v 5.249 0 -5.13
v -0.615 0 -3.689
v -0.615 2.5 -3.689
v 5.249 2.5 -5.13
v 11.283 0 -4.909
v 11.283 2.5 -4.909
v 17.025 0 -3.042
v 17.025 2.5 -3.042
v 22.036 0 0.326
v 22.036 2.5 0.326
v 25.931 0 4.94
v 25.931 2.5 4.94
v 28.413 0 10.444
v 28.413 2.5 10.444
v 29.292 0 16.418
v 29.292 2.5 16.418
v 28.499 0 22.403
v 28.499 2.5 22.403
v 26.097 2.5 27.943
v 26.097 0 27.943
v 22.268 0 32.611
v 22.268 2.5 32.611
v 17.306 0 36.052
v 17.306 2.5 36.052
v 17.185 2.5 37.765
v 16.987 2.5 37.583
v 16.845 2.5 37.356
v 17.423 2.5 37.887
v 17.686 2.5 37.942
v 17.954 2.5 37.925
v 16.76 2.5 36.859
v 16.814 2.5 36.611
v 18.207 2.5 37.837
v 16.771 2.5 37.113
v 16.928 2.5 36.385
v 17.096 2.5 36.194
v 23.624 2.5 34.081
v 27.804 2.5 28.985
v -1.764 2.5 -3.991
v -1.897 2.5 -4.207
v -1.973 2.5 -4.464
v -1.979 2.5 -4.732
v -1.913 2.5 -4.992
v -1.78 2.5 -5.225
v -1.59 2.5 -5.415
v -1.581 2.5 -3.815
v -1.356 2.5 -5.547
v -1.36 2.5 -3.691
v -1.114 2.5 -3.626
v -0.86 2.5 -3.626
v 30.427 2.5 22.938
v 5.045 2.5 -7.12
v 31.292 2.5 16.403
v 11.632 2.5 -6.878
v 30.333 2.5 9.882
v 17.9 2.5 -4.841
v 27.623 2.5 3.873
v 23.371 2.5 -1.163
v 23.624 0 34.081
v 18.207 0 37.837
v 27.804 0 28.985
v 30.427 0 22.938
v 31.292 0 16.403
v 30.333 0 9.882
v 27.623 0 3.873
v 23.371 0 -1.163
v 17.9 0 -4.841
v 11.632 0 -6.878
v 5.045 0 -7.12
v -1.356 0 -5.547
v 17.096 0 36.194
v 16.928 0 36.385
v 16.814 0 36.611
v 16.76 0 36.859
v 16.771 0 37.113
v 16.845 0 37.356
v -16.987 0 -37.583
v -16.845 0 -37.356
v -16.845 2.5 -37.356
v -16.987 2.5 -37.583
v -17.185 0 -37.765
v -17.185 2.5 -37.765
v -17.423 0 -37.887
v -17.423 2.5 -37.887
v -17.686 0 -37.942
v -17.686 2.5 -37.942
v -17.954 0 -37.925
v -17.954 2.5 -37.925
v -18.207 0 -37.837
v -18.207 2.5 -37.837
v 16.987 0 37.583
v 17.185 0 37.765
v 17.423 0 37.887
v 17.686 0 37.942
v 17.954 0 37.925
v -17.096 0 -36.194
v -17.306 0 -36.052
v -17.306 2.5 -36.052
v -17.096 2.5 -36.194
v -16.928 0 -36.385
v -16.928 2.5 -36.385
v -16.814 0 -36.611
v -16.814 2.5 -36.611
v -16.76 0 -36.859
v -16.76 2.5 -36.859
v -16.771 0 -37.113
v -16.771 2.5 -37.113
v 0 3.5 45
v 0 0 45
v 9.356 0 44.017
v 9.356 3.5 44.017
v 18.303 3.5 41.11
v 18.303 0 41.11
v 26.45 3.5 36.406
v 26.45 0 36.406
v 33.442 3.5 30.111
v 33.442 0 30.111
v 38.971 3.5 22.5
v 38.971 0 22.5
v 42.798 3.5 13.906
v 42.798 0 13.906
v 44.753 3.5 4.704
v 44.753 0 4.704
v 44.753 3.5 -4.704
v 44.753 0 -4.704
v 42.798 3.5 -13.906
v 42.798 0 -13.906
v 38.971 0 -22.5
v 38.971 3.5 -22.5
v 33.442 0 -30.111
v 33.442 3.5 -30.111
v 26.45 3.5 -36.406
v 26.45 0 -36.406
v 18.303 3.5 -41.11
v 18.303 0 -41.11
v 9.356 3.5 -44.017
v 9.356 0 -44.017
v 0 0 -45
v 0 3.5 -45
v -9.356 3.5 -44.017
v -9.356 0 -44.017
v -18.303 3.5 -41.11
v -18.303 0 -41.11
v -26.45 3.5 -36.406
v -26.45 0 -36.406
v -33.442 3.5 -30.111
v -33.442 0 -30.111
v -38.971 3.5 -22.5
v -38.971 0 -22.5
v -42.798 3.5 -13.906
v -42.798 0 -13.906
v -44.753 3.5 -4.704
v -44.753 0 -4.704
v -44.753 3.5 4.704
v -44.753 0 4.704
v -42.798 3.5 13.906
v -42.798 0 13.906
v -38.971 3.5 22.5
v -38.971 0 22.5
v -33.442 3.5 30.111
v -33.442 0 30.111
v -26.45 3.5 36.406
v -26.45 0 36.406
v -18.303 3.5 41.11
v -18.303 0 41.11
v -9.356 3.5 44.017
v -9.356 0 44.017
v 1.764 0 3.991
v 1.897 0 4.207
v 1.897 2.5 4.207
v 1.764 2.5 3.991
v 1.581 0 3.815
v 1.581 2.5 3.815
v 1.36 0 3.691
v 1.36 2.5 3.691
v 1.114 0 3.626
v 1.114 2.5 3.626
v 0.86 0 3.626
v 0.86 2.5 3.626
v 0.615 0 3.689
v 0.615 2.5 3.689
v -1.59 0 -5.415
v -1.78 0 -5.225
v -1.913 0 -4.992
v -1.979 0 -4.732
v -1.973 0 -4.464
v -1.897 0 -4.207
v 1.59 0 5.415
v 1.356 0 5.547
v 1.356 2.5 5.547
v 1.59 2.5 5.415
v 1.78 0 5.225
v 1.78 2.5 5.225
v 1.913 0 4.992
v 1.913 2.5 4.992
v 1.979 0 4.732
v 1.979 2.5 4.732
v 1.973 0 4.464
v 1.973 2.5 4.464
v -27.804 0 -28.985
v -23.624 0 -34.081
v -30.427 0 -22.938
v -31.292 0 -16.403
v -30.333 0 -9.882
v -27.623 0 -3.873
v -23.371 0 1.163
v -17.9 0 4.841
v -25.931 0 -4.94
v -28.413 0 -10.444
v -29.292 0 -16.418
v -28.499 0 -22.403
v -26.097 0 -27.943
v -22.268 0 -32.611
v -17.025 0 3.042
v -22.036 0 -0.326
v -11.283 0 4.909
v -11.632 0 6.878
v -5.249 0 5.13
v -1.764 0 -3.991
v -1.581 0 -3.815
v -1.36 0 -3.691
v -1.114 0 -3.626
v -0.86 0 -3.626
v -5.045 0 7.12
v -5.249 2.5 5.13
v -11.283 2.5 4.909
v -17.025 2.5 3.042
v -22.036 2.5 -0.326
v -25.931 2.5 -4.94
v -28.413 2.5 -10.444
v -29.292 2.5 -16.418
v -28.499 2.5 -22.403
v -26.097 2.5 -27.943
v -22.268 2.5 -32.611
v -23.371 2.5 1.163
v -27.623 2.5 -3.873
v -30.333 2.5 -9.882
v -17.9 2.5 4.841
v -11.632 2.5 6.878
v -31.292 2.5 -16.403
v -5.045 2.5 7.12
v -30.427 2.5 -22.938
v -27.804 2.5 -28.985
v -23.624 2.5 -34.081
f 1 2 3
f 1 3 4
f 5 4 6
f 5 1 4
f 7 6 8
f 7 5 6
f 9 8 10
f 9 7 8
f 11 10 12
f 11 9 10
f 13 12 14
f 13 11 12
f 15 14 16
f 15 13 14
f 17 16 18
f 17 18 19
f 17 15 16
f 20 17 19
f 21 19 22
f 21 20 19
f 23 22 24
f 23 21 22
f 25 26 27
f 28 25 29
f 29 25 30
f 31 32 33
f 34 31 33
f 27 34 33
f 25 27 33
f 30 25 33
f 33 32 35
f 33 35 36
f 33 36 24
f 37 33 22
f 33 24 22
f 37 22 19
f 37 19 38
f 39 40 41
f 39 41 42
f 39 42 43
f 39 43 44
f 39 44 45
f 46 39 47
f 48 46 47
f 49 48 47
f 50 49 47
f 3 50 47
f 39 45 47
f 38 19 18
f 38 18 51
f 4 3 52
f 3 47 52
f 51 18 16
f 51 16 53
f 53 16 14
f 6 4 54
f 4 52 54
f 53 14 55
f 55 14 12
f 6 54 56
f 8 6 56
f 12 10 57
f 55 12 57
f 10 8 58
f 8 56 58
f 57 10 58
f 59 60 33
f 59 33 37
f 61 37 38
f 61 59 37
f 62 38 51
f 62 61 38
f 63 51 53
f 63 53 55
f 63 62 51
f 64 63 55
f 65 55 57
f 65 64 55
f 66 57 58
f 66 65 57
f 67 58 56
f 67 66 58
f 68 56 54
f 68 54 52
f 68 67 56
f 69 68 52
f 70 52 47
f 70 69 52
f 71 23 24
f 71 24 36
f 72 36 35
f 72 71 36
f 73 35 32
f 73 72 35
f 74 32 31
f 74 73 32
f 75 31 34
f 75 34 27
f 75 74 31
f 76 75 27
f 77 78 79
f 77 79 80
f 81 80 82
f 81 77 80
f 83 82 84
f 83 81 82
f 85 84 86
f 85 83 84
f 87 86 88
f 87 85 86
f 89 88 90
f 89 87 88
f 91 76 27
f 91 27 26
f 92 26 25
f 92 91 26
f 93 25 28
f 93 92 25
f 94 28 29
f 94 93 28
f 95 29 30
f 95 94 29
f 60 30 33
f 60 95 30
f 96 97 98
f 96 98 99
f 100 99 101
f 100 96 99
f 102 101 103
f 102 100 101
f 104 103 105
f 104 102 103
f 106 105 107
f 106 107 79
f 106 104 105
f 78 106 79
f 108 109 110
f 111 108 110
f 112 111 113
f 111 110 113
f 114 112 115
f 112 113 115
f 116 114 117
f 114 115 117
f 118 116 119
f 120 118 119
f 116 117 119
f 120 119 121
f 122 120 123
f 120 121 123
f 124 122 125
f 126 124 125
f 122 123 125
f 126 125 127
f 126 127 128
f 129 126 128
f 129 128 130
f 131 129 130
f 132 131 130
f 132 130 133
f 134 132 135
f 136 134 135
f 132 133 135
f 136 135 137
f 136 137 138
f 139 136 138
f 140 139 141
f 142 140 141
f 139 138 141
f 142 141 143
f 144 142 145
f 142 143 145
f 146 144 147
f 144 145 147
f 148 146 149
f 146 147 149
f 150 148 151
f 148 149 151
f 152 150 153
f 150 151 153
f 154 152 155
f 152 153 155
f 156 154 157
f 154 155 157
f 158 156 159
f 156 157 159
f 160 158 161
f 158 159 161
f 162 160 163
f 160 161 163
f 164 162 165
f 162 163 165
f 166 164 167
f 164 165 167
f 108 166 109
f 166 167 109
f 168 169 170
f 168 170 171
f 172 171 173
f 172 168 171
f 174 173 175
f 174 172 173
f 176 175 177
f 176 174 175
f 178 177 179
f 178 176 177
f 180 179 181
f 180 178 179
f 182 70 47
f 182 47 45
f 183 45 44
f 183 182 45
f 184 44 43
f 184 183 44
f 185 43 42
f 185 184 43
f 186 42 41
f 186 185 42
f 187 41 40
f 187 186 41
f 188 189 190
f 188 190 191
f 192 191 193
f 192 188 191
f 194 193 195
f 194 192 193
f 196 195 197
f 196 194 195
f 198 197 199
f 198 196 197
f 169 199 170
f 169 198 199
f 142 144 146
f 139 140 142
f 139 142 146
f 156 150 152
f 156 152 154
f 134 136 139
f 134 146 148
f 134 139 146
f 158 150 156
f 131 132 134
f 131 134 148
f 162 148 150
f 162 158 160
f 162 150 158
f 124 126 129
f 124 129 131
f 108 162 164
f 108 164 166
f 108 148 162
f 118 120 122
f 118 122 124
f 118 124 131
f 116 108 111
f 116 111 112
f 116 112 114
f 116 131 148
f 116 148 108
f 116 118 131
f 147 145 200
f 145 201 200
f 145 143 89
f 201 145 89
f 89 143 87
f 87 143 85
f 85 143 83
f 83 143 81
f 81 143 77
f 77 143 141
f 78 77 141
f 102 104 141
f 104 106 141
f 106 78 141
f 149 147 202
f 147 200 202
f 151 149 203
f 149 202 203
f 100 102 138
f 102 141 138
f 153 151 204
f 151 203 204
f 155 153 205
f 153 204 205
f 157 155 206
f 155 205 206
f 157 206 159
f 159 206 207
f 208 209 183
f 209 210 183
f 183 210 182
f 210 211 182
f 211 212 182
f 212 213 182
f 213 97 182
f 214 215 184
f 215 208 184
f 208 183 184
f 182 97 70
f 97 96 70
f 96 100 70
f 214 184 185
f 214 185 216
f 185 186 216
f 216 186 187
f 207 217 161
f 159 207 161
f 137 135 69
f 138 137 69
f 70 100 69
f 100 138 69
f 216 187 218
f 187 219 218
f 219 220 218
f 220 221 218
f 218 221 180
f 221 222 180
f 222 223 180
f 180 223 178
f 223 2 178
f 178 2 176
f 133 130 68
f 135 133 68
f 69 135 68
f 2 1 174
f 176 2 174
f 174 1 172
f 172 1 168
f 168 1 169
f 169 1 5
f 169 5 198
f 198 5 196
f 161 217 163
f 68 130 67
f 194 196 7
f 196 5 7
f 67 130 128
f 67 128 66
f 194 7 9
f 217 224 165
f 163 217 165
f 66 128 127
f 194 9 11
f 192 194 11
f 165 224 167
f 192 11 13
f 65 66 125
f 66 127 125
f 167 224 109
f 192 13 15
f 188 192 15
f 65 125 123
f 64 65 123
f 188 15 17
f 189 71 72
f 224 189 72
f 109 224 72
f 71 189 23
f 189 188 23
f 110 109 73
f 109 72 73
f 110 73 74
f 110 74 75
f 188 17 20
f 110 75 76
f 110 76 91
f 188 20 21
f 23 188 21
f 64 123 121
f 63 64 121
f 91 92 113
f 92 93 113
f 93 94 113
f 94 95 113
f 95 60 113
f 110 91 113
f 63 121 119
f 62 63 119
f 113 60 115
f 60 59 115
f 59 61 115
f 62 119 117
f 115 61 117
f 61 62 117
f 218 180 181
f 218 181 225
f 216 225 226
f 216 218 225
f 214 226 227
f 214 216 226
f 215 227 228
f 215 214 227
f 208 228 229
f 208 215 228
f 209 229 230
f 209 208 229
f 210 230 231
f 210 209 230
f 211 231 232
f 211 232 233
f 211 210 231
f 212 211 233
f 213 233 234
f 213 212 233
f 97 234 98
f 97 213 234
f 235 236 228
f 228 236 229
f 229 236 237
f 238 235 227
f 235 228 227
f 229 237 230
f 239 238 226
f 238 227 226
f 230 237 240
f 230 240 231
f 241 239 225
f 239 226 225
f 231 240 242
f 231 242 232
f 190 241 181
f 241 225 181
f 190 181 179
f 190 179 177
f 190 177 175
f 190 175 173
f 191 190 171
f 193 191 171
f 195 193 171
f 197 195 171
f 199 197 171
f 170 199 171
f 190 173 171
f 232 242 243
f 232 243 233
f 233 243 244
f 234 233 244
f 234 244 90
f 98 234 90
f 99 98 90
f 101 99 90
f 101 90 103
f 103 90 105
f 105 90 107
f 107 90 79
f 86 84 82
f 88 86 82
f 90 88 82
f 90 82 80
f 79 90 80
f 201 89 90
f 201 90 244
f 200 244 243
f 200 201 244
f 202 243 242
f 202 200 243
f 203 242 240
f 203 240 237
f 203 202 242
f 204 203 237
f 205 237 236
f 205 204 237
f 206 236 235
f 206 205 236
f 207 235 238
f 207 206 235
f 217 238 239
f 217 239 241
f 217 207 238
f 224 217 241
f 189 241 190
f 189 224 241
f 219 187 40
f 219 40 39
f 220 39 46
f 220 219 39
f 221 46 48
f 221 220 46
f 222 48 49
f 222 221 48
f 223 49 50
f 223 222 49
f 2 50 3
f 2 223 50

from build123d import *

# Parameters (mm, degrees)
SKETCH1_R           = 45
BOSS_EXTRUDE1_DEPTH = 3.5
CAVITY1_DEPTH       = 2.5


# Read off the part's stored shape, not the designer's step: Cavity1
with BuildPart() as part:
    # Sketch1 → Boss-Extrude1 (new body)
    with BuildSketch(Plane(origin=(0, 0, 0), x_dir=(1, 0, 0), z_dir=(0, 1, 0))):
        with Locations(Location((0, 0, 0), (0, 0, 270))):
            Circle(SKETCH1_R)
    extrude(amount=BOSS_EXTRUDE1_DEPTH)

    # Cavity1 outline → Cavity1 (cut)
    with BuildSketch(Plane(origin=(0, 0, 0), x_dir=(1, 0, 0), z_dir=(0, 1, 0))):
        with BuildLine():
            ThreePointArc((-1.897013309, 4.206804256), (-1.35975038, 3.69058849), (-0.614681205, 3.689140702))
            ThreePointArc((-0.614681205, 3.689140702), (27.363668078, -7.605415279), (17.306098008, -36.05186159))
            ThreePointArc((17.306098008, -36.05186159), (16.813923428, -36.611231194), (16.845129248, -37.355647991))
            ThreePointArc((16.845129248, -37.355647991), (17.423389863, -37.887377997), (18.207362086, -37.837281165))
            ThreePointArc((18.207362086, -37.837281165), (29.186869676, -6.783262051), (-1.356143814, 5.546621038))
            ThreePointArc((-1.356143814, 5.546621038), (-1.91270489, 4.992218741), (-1.897013309, 4.206804256))
        make_face()
        with BuildLine():
            ThreePointArc((1.897013309, -4.206804256), (1.35975038, -3.69058849), (0.614681205, -3.689140702))
            ThreePointArc((0.614681205, -3.689140702), (-27.363668078, 7.605415279), (-17.306098008, 36.05186159))
            ThreePointArc((-17.306098008, 36.05186159), (-16.813923428, 36.611231194), (-16.845129248, 37.355647991))
            ThreePointArc((-16.845129248, 37.355647991), (-17.423389863, 37.887377997), (-18.207362086, 37.837281165))
            ThreePointArc((-18.207362086, 37.837281165), (-29.186869676, 6.783262051), (1.356143814, -5.546621038))
            ThreePointArc((1.356143814, -5.546621038), (1.91270489, -4.992218741), (1.897013309, -4.206804256))
        make_face()
    extrude(amount=CAVITY1_DEPTH, mode=Mode.SUBTRACT)


solid = part.part
